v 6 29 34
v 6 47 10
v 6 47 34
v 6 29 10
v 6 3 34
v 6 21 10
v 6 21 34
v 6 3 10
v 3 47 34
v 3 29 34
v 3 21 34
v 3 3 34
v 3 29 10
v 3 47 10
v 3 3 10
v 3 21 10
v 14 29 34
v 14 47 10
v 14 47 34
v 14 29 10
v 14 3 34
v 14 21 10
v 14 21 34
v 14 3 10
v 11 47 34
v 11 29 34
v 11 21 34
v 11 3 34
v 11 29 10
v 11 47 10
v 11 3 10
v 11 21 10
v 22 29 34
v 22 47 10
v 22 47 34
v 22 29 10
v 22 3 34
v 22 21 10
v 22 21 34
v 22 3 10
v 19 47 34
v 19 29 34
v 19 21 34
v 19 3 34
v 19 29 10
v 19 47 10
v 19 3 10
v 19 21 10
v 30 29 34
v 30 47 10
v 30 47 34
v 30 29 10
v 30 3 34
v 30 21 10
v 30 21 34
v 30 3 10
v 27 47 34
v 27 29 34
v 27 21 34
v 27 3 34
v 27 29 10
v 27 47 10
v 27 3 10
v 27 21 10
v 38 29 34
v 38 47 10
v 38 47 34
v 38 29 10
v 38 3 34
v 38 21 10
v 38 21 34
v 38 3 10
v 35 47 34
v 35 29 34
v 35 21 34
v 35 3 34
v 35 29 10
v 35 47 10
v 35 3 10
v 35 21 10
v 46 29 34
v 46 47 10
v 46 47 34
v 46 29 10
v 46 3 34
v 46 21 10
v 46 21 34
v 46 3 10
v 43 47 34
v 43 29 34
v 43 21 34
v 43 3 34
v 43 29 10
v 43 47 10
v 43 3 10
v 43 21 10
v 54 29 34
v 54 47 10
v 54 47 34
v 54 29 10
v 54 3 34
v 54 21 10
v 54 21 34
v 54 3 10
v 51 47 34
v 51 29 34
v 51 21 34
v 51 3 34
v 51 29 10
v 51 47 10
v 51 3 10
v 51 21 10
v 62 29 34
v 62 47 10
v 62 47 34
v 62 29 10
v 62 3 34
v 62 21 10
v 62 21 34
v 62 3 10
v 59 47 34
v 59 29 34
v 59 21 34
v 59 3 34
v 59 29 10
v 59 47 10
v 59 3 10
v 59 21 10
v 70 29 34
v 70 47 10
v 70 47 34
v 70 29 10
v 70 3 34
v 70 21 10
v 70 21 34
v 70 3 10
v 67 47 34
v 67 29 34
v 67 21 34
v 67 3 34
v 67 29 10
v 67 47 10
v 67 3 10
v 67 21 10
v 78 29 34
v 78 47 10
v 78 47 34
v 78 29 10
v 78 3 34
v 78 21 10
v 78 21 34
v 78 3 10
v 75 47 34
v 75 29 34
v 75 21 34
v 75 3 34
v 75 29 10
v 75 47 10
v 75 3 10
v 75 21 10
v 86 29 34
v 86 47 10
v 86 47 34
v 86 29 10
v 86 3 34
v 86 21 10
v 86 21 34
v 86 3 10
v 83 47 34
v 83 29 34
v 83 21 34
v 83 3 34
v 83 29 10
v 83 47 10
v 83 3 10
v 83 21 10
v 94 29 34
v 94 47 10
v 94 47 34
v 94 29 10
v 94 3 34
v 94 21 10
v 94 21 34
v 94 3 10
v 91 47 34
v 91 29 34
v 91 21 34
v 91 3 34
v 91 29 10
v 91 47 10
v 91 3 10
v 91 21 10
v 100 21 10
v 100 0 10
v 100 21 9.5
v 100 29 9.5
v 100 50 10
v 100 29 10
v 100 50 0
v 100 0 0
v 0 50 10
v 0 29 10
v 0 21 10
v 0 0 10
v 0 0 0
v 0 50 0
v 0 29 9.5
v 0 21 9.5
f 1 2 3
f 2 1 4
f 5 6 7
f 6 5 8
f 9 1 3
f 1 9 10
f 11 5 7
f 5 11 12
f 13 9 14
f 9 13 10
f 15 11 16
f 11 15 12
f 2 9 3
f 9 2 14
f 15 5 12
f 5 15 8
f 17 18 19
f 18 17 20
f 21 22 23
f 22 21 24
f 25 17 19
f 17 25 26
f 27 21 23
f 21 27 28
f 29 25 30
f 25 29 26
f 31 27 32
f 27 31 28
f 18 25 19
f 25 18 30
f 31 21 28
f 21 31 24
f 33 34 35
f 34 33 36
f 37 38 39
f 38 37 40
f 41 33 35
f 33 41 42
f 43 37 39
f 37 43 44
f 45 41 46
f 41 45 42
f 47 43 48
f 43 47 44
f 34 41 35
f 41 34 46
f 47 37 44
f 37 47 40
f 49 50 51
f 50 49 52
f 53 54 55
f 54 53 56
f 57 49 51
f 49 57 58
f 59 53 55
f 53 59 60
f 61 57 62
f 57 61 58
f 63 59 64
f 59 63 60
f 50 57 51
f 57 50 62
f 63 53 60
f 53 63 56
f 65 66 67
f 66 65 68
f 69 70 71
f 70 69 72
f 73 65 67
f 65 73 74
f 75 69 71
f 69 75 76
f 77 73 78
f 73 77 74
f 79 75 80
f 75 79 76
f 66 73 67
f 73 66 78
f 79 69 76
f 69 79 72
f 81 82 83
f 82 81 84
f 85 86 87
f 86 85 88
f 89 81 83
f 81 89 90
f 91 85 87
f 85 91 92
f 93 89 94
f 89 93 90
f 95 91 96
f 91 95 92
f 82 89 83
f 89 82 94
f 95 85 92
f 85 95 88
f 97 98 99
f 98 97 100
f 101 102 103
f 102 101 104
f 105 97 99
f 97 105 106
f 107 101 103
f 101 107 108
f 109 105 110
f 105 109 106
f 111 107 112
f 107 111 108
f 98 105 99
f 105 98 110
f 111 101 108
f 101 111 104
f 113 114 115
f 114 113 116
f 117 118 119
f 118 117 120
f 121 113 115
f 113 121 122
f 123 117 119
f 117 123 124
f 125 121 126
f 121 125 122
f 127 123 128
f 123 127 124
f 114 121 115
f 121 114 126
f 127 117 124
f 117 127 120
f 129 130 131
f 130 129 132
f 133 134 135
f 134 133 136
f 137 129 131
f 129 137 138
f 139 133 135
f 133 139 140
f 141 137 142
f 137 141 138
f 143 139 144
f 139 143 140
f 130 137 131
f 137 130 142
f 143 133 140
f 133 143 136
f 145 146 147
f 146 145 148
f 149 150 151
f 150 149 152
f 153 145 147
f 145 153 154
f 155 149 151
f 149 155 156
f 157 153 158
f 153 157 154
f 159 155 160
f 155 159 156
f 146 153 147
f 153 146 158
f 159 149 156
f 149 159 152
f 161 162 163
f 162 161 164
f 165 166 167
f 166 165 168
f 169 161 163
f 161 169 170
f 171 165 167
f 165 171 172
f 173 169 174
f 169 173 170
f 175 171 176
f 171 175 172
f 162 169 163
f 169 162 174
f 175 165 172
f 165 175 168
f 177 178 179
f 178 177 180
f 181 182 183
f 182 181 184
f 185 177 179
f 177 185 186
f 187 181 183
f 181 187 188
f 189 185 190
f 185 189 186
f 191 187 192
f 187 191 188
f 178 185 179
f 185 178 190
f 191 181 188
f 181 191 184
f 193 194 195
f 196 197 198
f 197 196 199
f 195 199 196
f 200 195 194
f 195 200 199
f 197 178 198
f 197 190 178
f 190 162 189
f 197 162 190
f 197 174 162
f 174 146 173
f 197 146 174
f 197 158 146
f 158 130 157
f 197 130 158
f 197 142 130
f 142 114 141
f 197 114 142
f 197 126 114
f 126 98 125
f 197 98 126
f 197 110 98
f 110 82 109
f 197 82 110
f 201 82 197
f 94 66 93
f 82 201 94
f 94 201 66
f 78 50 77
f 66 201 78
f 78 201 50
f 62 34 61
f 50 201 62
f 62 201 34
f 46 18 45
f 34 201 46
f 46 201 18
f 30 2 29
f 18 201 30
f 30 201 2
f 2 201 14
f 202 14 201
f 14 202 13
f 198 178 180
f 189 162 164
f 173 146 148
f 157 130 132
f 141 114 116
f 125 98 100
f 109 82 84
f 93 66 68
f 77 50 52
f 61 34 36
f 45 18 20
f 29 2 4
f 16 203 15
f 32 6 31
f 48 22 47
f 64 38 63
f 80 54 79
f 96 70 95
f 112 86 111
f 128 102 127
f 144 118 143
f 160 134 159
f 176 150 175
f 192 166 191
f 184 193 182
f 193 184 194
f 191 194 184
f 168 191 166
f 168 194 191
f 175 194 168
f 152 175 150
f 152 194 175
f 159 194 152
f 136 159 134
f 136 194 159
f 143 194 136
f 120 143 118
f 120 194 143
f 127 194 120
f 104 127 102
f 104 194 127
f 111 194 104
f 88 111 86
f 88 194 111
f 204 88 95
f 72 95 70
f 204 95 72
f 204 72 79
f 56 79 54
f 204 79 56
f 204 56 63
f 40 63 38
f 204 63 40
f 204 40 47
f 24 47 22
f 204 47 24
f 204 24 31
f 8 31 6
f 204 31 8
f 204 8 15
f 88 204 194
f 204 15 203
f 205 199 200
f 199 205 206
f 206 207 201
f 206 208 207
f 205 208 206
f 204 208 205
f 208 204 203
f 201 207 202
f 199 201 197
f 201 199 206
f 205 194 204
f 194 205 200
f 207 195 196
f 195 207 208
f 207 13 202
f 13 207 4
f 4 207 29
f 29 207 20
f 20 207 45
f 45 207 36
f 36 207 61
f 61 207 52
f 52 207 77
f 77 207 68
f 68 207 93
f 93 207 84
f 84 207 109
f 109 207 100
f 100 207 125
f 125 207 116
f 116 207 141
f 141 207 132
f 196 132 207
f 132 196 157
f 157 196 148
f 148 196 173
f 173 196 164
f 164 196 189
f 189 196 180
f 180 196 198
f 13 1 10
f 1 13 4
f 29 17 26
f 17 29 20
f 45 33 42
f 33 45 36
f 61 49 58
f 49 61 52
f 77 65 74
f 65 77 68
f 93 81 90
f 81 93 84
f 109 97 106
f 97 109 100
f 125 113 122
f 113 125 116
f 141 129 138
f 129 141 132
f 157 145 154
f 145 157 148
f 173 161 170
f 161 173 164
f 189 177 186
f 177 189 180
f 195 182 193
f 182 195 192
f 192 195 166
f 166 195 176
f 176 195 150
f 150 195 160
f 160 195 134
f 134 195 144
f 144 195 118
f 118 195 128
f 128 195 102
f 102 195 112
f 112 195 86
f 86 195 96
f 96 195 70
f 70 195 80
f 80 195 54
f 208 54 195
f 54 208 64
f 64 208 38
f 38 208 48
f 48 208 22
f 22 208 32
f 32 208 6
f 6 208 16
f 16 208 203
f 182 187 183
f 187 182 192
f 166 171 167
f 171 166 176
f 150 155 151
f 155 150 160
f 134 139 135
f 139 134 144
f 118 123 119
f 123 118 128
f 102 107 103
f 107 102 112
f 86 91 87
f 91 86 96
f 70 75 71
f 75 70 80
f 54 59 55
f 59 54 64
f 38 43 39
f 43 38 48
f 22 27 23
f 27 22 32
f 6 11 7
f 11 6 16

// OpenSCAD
$fn = 32;

// ----------------------------------------------------------------------
// Heatsink: slotted fin block
// ----------------------------------------------------------------------

// --- parameters (mm) ---
base_l = 100;             // base length, X
base_w = 50;              // base width, Y
base_t = 10;              // base plate thickness
fin_h = 25;               // fin height above the base
fin_t = 3;                // fin thickness
edge = 3;                 // margin from the base ends
pitch = 8;                // fin pitch
slot_w = 8;               // central slot width, Y
fit_tol = 0.1;            // tolerance for press fits, mm
free_tol = 0.3;           // tolerance for clearance fits, mm

n_fins = floor((base_l - 2 * edge - fin_t) / pitch) + 1;  // fin count
total_h = base_t + fin_h - 1;  // overall height

difference() {
union() {
  cube([base_l, base_w, base_t]);
  for (i = [0 : n_fins - 1])
    translate([edge + i * pitch, edge, base_t - 1])
      cube([fin_t, base_w - 2 * edge, fin_h]);
}
  translate([-1, base_w / 2 - slot_w / 2, base_t - 0.5])
    cube([base_l + 2, slot_w, fin_h + 2]);
}
